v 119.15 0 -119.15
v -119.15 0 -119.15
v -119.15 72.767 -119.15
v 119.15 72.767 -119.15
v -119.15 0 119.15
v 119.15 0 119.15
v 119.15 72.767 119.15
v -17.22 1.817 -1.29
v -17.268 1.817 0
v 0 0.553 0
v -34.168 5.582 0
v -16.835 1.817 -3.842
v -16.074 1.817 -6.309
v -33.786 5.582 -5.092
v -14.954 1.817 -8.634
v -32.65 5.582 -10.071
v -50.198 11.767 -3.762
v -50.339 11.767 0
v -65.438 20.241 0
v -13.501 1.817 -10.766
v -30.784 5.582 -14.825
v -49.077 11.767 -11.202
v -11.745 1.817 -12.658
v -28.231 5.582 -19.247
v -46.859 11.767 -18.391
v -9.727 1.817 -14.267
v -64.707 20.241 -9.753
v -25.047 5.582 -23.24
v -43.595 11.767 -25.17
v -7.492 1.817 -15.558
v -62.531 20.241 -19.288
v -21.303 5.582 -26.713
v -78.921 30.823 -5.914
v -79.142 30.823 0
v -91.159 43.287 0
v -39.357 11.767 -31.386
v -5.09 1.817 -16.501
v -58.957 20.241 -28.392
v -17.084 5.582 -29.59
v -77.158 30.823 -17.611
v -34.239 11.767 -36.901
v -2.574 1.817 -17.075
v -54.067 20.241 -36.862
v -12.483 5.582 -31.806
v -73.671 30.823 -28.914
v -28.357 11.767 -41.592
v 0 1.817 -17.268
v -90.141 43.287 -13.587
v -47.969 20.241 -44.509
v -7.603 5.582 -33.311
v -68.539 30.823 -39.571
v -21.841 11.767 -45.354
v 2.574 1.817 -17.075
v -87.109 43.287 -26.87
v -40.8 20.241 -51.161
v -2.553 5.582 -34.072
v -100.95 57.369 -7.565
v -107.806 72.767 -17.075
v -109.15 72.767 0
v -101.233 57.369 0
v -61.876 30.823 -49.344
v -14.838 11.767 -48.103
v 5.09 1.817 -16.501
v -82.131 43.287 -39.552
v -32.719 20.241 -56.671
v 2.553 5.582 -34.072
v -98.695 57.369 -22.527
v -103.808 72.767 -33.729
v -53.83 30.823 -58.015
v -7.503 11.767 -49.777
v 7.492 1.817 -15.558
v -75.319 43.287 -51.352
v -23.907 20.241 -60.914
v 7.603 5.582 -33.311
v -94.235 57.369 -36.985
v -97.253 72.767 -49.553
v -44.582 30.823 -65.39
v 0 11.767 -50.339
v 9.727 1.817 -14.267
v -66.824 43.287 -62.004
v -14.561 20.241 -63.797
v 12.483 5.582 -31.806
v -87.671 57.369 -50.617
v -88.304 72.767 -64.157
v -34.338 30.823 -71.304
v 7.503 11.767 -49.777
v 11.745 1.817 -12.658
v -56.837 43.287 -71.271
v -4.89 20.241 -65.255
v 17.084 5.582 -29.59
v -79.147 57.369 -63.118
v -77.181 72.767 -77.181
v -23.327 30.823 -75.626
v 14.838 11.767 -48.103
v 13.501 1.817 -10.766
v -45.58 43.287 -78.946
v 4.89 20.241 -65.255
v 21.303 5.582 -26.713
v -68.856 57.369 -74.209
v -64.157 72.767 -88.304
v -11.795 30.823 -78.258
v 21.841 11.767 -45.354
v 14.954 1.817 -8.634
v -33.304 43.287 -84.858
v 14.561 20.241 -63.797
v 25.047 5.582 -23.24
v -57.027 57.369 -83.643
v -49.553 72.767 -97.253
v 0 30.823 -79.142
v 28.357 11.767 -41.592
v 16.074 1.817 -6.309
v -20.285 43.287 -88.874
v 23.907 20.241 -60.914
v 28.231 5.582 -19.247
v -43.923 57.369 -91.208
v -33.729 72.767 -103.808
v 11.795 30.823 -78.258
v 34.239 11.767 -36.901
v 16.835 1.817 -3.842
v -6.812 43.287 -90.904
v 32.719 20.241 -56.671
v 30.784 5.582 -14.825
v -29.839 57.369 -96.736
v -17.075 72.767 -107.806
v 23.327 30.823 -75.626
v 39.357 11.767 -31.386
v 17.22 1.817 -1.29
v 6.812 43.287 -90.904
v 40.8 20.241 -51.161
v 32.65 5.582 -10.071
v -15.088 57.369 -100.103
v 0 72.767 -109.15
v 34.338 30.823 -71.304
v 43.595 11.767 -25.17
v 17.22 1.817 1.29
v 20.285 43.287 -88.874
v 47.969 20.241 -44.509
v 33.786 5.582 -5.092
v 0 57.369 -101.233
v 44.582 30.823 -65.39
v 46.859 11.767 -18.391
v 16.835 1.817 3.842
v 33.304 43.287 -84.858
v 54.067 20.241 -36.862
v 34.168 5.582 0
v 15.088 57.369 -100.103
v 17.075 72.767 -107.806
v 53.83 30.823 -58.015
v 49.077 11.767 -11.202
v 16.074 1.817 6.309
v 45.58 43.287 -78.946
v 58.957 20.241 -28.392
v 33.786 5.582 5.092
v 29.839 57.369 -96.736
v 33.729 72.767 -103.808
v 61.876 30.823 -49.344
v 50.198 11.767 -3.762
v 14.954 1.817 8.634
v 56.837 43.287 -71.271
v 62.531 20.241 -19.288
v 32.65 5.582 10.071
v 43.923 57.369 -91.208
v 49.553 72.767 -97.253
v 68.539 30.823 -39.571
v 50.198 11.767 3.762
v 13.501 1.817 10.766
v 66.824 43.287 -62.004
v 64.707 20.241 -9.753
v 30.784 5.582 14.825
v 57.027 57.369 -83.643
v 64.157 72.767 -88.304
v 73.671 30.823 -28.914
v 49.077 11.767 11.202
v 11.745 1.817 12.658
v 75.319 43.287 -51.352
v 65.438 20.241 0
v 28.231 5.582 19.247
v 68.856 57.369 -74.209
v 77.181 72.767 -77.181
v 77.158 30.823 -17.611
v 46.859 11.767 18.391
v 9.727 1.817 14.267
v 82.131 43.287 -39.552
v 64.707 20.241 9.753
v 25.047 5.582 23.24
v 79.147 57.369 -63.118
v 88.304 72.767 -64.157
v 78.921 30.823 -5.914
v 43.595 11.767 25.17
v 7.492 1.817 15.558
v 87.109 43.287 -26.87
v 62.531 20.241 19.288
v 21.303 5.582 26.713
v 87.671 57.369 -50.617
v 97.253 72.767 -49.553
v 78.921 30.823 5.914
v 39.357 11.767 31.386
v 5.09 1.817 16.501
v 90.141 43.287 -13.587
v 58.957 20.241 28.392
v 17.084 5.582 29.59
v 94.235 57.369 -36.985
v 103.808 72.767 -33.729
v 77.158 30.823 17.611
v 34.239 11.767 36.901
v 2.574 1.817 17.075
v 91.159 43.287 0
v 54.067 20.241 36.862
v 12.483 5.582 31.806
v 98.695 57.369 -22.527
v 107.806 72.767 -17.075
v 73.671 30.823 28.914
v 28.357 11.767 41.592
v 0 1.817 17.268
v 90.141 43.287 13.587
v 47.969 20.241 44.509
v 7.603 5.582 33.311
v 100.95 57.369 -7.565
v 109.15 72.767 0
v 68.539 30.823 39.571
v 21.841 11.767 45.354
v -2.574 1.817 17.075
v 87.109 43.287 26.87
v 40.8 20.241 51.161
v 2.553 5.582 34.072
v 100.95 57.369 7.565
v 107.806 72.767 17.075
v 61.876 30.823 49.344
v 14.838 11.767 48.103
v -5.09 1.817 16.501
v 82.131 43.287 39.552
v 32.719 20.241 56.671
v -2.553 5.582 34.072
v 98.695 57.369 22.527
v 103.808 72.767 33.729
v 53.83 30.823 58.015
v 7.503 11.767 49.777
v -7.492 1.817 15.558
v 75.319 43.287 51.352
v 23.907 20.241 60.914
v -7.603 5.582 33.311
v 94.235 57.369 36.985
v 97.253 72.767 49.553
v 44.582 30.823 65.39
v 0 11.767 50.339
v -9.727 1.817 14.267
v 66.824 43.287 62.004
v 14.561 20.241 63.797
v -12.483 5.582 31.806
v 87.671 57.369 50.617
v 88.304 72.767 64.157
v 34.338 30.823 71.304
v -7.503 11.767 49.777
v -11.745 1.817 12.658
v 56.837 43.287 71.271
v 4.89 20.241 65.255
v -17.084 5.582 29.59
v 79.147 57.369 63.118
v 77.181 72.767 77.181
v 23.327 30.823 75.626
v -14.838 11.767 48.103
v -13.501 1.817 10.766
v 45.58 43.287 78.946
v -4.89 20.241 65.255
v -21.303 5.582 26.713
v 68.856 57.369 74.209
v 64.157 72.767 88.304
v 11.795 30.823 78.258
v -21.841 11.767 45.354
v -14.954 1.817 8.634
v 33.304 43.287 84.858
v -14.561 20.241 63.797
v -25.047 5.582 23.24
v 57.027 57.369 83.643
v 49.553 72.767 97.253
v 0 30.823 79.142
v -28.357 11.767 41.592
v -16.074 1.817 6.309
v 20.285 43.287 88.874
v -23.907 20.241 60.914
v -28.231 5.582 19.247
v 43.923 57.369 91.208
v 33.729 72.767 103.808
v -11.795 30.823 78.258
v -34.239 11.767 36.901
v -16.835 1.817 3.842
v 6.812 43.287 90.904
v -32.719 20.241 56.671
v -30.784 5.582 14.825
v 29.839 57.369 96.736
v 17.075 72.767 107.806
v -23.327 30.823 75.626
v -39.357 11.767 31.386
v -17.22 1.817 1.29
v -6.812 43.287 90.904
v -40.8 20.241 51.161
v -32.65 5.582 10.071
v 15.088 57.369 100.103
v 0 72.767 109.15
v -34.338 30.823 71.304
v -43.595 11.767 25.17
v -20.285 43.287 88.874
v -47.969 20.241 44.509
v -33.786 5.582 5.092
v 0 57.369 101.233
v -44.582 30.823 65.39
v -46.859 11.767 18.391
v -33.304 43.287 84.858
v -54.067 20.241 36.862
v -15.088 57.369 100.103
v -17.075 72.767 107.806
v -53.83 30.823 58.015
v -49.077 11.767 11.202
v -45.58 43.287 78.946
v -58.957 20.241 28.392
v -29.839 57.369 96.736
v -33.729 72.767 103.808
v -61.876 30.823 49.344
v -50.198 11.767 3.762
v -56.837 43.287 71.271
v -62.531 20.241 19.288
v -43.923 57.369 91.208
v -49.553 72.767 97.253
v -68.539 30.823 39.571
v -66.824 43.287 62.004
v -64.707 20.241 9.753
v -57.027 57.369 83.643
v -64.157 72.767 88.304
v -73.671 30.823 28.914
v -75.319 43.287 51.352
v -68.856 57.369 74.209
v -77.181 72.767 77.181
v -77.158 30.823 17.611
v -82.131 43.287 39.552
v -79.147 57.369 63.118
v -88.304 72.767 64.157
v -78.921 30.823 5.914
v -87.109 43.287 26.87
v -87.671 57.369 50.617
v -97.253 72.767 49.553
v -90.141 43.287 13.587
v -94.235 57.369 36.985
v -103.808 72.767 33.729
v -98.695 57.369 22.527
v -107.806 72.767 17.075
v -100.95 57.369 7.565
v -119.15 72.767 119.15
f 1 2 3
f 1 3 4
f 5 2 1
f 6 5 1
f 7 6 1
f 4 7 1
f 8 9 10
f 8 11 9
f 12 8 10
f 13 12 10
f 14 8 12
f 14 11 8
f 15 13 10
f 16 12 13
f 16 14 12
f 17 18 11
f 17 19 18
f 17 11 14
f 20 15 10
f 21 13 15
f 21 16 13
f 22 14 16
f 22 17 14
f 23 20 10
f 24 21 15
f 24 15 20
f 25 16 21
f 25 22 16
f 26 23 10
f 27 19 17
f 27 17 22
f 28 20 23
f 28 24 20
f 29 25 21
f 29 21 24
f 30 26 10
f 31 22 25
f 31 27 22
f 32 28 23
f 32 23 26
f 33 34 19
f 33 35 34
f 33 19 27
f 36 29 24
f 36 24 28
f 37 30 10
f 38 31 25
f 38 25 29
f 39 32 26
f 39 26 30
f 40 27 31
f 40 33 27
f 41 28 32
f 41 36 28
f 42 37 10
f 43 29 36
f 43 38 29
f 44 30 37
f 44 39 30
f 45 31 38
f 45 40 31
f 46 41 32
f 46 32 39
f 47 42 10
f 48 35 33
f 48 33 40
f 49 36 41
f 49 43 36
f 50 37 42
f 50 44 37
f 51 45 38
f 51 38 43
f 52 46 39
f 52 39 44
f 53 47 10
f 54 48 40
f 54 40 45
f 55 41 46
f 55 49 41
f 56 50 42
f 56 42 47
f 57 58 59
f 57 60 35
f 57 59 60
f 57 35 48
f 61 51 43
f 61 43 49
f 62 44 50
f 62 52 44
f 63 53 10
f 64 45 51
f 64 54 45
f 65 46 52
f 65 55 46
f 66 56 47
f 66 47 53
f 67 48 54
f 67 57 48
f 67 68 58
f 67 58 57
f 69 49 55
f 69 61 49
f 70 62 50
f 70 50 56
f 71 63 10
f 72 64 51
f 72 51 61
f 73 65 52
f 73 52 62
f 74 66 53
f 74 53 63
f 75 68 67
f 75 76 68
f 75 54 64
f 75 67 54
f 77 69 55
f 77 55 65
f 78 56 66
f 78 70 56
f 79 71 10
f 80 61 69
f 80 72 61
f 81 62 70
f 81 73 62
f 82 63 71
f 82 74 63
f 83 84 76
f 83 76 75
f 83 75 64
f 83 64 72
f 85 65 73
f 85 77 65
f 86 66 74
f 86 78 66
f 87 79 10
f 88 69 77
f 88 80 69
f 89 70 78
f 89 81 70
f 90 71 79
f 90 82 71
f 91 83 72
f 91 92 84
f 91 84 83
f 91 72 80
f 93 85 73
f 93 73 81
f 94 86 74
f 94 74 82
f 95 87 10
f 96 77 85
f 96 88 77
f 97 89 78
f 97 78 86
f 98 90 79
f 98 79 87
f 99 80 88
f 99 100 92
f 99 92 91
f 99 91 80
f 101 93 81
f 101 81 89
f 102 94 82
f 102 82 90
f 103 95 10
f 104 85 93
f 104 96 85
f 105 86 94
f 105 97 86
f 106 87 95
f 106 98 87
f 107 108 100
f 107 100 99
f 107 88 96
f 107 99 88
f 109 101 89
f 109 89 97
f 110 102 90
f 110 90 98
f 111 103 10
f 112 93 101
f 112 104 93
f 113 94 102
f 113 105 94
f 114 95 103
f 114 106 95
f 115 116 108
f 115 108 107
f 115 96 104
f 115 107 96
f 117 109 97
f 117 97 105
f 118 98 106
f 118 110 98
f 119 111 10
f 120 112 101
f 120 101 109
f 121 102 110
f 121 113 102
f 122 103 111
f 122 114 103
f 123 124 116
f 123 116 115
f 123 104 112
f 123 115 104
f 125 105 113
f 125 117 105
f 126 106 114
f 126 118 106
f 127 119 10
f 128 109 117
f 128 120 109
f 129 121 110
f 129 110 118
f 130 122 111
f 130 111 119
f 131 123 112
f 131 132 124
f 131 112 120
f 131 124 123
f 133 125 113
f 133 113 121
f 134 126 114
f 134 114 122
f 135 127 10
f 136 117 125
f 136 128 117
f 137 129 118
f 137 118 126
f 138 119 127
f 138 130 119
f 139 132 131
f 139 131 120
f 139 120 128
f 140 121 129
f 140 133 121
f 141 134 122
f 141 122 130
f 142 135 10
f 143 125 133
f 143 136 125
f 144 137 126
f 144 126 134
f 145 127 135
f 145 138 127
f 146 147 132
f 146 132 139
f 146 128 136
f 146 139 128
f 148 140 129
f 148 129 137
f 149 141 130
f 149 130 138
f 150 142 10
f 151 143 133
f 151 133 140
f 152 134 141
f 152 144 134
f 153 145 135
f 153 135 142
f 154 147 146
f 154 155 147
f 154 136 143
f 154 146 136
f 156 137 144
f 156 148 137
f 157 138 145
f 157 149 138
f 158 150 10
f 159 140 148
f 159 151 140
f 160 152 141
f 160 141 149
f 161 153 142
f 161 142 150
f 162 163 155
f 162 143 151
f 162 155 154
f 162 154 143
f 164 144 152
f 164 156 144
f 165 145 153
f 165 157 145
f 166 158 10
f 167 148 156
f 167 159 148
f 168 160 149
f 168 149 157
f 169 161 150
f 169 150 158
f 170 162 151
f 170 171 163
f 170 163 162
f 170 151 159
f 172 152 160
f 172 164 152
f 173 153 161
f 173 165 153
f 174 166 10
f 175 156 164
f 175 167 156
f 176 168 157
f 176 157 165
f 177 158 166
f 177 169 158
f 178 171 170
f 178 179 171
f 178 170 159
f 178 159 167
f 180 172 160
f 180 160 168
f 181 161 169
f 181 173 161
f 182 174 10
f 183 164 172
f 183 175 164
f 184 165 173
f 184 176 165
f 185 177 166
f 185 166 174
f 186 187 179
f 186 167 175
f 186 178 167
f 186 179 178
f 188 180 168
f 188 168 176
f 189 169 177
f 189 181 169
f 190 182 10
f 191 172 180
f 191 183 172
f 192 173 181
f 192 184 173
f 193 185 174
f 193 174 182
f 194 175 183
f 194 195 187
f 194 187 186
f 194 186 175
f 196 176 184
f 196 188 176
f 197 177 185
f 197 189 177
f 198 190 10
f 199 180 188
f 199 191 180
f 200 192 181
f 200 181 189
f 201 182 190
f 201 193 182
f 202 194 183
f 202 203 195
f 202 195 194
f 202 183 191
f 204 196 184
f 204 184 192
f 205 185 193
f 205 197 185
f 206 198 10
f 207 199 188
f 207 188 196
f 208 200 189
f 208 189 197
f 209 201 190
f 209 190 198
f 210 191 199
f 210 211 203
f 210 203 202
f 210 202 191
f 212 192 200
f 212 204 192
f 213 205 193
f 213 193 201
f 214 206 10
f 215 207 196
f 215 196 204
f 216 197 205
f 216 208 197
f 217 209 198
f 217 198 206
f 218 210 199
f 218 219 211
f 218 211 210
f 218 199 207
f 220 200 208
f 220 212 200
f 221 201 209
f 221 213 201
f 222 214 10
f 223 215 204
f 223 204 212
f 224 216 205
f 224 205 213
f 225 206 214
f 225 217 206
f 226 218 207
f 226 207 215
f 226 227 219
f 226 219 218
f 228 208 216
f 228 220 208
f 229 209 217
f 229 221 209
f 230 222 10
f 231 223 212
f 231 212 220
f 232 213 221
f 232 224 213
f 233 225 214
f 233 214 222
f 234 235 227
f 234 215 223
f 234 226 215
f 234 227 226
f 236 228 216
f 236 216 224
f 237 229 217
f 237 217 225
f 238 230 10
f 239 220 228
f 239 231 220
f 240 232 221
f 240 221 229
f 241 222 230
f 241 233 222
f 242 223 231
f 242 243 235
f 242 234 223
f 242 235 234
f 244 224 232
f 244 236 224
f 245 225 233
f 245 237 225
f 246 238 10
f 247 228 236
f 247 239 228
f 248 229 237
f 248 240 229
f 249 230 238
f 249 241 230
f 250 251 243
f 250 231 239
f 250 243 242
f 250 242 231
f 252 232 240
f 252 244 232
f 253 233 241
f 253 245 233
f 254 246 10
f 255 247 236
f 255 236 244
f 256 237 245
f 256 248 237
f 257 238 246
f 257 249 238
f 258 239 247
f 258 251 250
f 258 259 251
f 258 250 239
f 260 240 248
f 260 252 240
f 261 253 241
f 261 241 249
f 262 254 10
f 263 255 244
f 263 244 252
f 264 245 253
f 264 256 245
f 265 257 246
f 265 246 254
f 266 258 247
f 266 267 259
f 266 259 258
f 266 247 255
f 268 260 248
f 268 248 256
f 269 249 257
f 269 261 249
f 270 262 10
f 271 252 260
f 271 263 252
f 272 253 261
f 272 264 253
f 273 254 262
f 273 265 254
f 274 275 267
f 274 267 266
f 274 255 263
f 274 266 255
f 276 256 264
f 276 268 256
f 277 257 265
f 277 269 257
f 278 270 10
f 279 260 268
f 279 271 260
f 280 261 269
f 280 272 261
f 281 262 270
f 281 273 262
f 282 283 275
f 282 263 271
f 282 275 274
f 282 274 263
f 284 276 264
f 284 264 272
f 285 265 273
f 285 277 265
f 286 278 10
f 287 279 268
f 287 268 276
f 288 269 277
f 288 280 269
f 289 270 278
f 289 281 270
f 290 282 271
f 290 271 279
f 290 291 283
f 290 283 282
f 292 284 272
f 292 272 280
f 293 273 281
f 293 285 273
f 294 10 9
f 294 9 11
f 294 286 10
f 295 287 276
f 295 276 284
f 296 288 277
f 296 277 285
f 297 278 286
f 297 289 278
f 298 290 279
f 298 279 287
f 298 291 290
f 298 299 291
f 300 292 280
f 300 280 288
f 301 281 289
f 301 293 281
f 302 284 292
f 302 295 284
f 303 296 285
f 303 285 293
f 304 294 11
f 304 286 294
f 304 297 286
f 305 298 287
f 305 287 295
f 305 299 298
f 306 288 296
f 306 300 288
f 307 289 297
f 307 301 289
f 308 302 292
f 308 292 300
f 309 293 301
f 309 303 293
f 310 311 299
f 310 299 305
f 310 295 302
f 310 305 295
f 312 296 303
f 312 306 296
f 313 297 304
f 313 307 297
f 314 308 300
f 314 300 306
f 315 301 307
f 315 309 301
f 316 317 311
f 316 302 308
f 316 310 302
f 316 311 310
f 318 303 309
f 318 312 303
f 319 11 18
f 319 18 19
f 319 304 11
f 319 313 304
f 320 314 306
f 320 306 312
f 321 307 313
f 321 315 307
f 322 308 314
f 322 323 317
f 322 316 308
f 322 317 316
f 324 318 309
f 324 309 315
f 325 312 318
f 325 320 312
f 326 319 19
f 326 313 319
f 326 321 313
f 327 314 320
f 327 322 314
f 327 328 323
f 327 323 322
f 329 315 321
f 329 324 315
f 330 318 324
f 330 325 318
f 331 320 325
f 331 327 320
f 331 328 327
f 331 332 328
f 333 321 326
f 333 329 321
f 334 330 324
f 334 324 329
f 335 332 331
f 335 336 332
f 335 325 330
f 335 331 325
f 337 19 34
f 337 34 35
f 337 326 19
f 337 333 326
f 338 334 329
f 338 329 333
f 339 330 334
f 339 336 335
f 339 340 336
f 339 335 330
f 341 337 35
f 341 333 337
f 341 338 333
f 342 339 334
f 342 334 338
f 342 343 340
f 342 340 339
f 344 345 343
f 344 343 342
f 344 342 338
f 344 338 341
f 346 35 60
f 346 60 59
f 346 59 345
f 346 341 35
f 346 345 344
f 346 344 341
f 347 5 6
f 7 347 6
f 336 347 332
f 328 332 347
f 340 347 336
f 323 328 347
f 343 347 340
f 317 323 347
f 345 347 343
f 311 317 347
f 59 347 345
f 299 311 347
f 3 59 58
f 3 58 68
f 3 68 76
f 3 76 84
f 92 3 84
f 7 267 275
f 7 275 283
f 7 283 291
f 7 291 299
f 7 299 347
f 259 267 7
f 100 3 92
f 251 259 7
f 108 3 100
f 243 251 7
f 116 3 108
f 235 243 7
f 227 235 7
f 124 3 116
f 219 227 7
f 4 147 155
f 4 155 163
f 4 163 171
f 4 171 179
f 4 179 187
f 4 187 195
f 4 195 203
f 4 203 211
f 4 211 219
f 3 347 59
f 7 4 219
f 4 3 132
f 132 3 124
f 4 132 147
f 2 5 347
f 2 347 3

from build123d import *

# Parameters (mm, degrees)
SKETCH1_W           = 238.3
SKETCH1_H           = 238.3
BOSS_EXTRUDE1_DEPTH = 72.766666667


with BuildPart() as part:
    # Sketch1 → Boss-Extrude1 (new body)
    with BuildSketch(Plane(origin=(0, 0, 0), x_dir=(1, 0, 0), z_dir=(0, 1, 0))):
        Rectangle(SKETCH1_W, SKETCH1_H)
    extrude(amount=BOSS_EXTRUDE1_DEPTH)

    # Sketch3 → Cut-Revolve8 (revolve, cut)
    with BuildSketch(Plane.XY):
        with BuildLine():
            Line((-109.15, 72.766666667), (0, 72.766666667))
            Line((0, 72.766666667), (0, 10))
            Line((0, 10), (0, 0.553473444))
            ThreePointArc((0, 0.553473444), (-65.437886151, 20.240853976), (-109.15, 72.766666667))
        make_face()
    revolve(axis=Axis((0, 72.766666667, 0), (0, -1, 0)), mode=Mode.SUBTRACT)


solid = part.part
